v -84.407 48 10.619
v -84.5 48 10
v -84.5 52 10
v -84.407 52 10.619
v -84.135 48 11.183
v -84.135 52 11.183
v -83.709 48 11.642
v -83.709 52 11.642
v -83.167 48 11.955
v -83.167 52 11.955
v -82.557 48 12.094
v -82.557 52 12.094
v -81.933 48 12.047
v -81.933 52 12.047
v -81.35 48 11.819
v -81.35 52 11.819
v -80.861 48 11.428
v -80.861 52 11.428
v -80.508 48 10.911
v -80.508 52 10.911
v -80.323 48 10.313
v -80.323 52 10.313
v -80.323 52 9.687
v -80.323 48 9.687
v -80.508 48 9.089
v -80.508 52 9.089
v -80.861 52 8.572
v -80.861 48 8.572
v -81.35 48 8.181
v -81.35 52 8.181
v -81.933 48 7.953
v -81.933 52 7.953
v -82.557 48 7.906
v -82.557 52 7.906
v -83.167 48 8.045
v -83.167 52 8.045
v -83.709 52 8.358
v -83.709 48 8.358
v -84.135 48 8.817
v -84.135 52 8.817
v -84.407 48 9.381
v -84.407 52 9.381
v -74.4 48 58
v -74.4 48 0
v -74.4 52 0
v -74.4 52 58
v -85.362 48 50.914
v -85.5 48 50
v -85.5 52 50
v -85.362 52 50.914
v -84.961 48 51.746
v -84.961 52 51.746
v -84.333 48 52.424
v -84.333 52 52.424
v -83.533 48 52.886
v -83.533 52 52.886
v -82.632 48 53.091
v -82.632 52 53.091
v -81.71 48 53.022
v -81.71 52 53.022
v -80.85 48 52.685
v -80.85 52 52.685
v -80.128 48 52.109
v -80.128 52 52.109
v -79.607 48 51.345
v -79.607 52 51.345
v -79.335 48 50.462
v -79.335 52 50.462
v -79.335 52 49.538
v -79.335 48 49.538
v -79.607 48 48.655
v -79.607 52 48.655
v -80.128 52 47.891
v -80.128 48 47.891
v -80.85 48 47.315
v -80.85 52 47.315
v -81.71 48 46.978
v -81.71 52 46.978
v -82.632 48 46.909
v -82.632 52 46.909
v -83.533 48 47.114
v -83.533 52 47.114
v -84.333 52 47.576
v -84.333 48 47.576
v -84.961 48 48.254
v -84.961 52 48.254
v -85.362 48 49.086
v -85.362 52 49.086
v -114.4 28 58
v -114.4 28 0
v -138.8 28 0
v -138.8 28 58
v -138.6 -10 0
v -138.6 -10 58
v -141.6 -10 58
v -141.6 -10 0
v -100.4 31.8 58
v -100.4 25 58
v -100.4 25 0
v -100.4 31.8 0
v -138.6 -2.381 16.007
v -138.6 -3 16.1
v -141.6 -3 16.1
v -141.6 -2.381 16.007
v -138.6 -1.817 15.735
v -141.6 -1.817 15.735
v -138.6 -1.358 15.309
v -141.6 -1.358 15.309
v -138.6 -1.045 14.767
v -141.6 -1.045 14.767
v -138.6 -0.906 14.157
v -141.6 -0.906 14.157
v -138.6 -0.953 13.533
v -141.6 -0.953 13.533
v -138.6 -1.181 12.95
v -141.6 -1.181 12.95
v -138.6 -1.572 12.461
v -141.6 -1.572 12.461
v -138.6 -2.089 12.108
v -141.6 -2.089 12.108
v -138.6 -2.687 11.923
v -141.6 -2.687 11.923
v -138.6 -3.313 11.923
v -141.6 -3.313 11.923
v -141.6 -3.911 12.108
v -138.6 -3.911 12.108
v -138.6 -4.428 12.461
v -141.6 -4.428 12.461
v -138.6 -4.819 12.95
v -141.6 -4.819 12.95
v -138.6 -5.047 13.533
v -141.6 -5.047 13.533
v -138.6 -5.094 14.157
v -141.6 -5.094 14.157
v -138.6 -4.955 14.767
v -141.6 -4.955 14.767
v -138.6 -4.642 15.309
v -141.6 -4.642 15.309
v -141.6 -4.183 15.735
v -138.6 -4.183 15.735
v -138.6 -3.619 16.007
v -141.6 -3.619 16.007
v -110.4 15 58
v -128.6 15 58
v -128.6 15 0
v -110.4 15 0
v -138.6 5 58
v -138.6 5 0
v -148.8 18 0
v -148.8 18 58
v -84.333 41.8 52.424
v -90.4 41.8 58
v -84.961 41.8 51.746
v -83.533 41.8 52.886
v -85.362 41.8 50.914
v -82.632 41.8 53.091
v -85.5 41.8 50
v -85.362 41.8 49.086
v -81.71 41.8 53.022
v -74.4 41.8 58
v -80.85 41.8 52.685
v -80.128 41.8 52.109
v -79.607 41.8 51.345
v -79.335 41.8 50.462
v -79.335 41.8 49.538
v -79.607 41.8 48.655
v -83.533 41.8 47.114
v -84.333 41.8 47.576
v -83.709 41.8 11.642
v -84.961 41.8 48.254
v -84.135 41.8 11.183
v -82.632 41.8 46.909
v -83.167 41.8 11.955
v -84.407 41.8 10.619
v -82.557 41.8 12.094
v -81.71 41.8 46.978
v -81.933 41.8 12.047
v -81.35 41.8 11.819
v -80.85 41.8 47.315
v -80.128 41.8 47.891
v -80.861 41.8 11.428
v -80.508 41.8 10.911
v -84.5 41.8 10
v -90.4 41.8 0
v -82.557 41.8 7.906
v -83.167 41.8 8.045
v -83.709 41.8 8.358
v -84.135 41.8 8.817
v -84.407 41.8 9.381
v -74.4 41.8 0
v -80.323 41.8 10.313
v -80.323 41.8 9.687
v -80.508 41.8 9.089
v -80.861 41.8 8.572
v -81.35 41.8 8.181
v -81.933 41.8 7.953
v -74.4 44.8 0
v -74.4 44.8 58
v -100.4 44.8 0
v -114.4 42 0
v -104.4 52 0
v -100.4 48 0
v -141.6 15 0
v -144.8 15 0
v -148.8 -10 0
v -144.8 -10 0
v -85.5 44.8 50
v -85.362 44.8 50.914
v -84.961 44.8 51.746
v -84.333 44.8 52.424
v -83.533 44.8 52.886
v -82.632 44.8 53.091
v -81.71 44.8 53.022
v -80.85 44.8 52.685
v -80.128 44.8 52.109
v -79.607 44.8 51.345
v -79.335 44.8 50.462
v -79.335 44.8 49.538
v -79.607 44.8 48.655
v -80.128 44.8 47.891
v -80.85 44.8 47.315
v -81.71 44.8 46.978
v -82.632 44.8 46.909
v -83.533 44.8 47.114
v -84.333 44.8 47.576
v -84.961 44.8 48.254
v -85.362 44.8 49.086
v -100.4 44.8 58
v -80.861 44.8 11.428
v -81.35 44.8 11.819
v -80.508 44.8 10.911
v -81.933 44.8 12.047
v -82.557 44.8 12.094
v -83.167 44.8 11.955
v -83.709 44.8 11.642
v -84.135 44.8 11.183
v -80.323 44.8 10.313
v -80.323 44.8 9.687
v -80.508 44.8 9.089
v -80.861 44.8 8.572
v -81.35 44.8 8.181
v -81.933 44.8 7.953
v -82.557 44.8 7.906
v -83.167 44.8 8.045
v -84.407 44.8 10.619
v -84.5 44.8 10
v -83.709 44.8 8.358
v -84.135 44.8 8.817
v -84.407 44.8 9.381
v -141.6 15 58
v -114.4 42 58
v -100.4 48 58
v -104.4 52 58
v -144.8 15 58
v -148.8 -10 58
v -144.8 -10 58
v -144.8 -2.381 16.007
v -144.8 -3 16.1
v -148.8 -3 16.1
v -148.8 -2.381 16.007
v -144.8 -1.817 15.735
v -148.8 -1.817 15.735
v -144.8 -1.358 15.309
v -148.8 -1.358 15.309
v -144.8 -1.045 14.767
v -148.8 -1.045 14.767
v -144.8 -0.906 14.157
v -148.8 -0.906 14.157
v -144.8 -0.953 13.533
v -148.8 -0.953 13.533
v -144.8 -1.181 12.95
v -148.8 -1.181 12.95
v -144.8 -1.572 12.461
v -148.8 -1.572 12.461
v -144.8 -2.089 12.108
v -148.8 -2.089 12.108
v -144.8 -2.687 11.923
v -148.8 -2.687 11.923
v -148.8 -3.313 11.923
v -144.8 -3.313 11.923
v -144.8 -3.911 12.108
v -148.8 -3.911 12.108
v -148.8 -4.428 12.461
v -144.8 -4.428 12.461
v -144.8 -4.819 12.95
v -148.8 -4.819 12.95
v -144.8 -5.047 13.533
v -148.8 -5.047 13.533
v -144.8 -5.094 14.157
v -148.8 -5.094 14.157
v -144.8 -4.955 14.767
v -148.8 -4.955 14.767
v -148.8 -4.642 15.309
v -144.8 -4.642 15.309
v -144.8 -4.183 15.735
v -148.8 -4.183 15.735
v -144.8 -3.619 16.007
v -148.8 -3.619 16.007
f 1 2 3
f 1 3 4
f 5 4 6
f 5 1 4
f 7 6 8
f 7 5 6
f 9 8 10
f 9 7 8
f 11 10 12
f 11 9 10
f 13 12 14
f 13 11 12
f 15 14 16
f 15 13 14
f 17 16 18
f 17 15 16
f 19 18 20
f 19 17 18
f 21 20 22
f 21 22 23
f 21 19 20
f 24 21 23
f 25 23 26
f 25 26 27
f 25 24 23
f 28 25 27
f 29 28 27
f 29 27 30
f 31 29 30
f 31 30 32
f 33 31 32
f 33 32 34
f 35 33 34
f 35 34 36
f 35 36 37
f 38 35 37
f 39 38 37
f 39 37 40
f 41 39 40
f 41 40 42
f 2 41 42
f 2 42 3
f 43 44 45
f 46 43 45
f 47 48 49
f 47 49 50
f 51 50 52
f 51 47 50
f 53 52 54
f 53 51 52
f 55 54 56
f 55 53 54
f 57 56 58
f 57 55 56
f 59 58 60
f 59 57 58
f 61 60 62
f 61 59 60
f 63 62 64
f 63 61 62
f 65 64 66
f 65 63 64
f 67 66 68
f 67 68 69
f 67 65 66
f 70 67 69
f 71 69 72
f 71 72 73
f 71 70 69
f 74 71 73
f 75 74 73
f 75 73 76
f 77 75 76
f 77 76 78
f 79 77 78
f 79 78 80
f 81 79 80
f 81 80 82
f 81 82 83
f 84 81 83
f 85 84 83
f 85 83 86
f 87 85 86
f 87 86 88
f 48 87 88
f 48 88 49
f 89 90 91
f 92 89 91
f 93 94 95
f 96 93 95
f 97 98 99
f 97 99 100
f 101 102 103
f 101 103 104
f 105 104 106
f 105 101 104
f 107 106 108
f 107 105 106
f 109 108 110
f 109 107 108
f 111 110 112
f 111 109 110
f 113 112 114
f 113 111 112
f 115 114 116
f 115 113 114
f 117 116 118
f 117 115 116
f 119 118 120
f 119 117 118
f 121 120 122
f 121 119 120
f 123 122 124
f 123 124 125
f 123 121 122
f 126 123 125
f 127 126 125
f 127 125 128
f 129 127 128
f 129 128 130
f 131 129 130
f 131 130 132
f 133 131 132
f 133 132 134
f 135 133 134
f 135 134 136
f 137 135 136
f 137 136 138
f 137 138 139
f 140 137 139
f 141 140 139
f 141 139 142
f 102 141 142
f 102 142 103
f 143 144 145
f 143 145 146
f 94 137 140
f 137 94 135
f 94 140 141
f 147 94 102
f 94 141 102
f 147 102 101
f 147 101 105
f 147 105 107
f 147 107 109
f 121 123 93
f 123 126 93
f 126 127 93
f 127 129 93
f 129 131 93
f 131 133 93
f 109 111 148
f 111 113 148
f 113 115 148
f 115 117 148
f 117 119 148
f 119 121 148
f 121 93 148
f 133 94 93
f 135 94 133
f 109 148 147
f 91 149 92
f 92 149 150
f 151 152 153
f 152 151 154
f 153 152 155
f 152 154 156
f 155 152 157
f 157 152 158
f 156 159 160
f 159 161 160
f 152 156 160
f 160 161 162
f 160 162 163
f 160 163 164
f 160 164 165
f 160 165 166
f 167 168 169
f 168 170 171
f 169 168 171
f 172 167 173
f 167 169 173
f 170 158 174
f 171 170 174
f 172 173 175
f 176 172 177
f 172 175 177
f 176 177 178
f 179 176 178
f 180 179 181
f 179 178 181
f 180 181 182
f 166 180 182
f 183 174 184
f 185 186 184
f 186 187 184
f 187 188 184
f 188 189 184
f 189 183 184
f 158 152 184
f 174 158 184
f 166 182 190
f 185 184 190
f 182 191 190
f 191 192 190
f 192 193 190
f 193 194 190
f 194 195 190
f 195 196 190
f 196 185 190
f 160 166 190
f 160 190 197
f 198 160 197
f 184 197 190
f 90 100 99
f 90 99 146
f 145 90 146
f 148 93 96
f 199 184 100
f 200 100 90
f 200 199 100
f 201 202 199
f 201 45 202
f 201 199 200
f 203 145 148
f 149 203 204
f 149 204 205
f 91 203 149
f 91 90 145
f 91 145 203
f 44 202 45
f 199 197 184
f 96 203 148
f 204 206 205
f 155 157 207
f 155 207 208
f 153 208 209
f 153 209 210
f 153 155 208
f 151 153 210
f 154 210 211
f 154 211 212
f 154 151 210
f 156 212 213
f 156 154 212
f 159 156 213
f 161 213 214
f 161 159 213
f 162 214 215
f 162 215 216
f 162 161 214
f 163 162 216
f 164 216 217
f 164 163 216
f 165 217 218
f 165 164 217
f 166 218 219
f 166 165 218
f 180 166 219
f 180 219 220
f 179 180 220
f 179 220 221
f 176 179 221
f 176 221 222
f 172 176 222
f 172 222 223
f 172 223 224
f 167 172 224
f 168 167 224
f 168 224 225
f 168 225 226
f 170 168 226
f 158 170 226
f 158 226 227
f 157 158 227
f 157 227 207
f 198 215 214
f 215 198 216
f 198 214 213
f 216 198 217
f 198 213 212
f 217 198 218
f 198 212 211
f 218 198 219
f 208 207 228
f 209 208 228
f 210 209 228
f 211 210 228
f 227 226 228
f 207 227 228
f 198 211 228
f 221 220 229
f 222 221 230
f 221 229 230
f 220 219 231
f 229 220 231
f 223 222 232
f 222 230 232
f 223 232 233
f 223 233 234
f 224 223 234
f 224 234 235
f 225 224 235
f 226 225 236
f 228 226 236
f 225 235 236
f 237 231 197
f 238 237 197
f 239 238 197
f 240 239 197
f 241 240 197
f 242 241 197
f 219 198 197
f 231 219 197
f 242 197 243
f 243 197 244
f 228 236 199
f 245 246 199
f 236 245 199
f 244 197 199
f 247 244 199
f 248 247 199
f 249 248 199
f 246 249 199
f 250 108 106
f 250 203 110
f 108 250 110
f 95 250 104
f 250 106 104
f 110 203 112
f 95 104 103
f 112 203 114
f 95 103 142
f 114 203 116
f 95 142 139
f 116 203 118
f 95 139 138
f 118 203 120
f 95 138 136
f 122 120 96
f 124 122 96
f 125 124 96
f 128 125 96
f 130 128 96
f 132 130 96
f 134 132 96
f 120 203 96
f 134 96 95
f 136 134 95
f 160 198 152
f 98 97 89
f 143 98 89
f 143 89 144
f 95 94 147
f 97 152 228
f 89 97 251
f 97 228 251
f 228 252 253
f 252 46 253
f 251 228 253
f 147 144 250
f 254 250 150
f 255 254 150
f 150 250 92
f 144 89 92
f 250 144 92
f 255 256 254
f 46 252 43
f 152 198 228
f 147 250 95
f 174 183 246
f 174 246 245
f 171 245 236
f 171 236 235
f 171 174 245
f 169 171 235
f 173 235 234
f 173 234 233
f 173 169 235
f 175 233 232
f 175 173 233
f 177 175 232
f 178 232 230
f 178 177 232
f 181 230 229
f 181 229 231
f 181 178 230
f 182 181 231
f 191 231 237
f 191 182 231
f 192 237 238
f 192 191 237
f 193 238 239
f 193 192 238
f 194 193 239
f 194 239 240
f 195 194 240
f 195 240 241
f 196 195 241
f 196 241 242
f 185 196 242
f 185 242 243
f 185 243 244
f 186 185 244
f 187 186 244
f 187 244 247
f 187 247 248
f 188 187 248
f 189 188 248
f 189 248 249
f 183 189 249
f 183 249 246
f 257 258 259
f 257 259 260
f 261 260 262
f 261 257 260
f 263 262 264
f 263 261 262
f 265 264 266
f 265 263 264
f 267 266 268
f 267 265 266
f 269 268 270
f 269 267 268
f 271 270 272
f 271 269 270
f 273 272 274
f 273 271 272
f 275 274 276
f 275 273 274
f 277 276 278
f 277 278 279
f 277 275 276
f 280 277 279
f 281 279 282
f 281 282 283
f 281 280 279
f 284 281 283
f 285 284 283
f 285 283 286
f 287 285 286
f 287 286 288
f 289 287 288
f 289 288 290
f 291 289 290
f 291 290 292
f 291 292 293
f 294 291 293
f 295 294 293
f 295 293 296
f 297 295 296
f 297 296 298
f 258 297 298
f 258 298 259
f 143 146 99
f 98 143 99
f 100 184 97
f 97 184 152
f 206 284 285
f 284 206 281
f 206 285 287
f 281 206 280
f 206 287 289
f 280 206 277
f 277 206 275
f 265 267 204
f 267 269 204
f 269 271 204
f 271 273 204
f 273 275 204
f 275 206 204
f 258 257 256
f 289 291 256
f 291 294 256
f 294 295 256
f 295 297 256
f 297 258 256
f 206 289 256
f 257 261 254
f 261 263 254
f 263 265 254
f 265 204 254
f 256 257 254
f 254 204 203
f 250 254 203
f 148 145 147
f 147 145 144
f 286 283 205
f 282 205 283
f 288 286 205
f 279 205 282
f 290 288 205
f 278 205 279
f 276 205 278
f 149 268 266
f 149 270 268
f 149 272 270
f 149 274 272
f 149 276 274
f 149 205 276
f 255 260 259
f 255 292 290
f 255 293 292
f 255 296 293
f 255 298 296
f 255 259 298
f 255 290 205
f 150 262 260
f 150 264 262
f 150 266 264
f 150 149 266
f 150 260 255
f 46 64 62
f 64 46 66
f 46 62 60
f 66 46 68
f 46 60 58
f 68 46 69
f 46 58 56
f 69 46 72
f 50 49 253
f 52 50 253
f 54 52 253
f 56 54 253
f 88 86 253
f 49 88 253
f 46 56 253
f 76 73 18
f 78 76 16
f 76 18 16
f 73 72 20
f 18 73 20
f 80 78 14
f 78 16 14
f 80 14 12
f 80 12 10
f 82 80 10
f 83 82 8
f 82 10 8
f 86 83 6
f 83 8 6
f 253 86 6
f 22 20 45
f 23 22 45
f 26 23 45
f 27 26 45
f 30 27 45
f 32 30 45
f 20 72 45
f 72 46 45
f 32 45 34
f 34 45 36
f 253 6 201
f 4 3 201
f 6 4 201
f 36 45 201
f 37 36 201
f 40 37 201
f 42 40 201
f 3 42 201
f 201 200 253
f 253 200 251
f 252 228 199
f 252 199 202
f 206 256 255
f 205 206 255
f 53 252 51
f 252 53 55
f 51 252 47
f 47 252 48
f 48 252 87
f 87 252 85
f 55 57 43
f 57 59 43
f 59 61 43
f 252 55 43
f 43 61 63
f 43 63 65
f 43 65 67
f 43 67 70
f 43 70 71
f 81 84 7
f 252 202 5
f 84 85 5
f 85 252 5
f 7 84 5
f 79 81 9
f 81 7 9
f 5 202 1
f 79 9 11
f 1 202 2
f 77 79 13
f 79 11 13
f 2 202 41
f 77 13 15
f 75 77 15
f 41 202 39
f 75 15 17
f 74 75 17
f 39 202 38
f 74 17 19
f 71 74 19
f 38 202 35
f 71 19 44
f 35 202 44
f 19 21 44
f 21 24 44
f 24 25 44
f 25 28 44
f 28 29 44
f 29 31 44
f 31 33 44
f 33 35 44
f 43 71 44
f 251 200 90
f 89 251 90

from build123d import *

# Parameters (mm, degrees)
DODANIE_WYCI_GNI_CIE1_DEPTH     = 58
SFAZOWANIE1_SIZE                = 10
SZKIC2_W                        = 4
SZKIC2_H                        = 58
SZKIC2_W_2                      = 3
DODANIE_WYCI_GNI_CIE2_DEPTH     = 10
SZKIC3_R                        = 2.1
SZKIC3_R_2                      = 3.1
WYTNIJ_WYCI_GNI_CIE1_DEPTH      = 108.622488356
SZKIC4_R                        = 2.1
WYTNIJ_WYCI_GNI_CIE2_DEPTH      = 101.943746711
WYTNIJ_WYCI_GNI_CIE3_DEPTH      = 168.894848045
WYTNIJ_WYCI_GNI_CIE3_DEPTH_BACK = 168.894848045
SZKIC5_W                        = 90.111418636
SZKIC5_H                        = 70.976902515


with BuildPart() as part:
    # Szkic1 → Dodanie-wyciągnięcie1 (new body)
    with BuildSketch(Plane.XY):
        Polygon((0, 0), (-4, 0), (-4, 15), (-7.2, 15), (-7.2, 0), (-10.2, 0), (-10.2, 15), (-38.4, 15), (-48.4, 25), (-48.4, 41.8), (-74.4, 41.8), (-74.4, 44.8), (-48.4, 44.8), (-48.4, 48), (-74.4, 48), (-74.4, 52), (-34.4, 52), (-34.4, 28), (0, 28), align=None)
    extrude(amount=DODANIE_WYCI_GNI_CIE1_DEPTH)

    # Sfazowanie1
    sfazowanie1_edges = [part.edges().sort_by_distance(p)[0] for p in [
        (-10.2, 15, 29),
        (-48.4, 41.8, 29),
        (-34.4, 52, 29),
        (0, 28, 29),
    ]]
    chamfer(sfazowanie1_edges, length=SFAZOWANIE1_SIZE)

    # Szkic2 → Dodanie-wyciągnięcie2 (add)
    with BuildSketch(Plane.XZ):
        with Locations((-2, 29)):
            Rectangle(SZKIC2_W, SZKIC2_H)
        with Locations((-8.7, 29)):
            Rectangle(SZKIC2_W_2, SZKIC2_H)
    extrude(amount=DODANIE_WYCI_GNI_CIE2_DEPTH)

    # Szkic3 → Wytnij-wyciągnięcie1 (cut, through all)
    with BuildSketch(Plane.XZ.offset(-41.8)):
        with Locations((-66.4, 10)):
            Circle(SZKIC3_R)
        with Locations((-66.4, 50)):
            Circle(SZKIC3_R_2)
    extrude(amount=-WYTNIJ_WYCI_GNI_CIE1_DEPTH, mode=Mode.SUBTRACT)

    # Szkic4 → Wytnij-wyciągnięcie2 (cut, through all)
    with BuildSketch(Plane.ZY.offset(10.2)):
        with Locations((14, -3)):
            Circle(SZKIC4_R)
    extrude(amount=-WYTNIJ_WYCI_GNI_CIE2_DEPTH, mode=Mode.SUBTRACT)


with BuildPart() as body_2:
    # Lustro1: mirrored copy
    add(part.part.mirror(Plane(origin=(-74.4, 52, 58), x_dir=(0, 0, 1), z_dir=(1, 0, 0))))


with BuildPart() as part_1:
    add(part.part)

    # Szkic5 → Wytnij-wyciągnięcie3 (cut, two sides: drawn at the far end of the back side and taken through both)
    with BuildSketch(Plane.XZ.offset(-41.8).offset(-WYTNIJ_WYCI_GNI_CIE3_DEPTH_BACK)):
        with Locations((-29.344290682, 35.488451258)):
            Rectangle(SZKIC5_W, SZKIC5_H)
    extrude(amount=WYTNIJ_WYCI_GNI_CIE3_DEPTH + WYTNIJ_WYCI_GNI_CIE3_DEPTH_BACK, mode=Mode.SUBTRACT)


solid = body_2.part
